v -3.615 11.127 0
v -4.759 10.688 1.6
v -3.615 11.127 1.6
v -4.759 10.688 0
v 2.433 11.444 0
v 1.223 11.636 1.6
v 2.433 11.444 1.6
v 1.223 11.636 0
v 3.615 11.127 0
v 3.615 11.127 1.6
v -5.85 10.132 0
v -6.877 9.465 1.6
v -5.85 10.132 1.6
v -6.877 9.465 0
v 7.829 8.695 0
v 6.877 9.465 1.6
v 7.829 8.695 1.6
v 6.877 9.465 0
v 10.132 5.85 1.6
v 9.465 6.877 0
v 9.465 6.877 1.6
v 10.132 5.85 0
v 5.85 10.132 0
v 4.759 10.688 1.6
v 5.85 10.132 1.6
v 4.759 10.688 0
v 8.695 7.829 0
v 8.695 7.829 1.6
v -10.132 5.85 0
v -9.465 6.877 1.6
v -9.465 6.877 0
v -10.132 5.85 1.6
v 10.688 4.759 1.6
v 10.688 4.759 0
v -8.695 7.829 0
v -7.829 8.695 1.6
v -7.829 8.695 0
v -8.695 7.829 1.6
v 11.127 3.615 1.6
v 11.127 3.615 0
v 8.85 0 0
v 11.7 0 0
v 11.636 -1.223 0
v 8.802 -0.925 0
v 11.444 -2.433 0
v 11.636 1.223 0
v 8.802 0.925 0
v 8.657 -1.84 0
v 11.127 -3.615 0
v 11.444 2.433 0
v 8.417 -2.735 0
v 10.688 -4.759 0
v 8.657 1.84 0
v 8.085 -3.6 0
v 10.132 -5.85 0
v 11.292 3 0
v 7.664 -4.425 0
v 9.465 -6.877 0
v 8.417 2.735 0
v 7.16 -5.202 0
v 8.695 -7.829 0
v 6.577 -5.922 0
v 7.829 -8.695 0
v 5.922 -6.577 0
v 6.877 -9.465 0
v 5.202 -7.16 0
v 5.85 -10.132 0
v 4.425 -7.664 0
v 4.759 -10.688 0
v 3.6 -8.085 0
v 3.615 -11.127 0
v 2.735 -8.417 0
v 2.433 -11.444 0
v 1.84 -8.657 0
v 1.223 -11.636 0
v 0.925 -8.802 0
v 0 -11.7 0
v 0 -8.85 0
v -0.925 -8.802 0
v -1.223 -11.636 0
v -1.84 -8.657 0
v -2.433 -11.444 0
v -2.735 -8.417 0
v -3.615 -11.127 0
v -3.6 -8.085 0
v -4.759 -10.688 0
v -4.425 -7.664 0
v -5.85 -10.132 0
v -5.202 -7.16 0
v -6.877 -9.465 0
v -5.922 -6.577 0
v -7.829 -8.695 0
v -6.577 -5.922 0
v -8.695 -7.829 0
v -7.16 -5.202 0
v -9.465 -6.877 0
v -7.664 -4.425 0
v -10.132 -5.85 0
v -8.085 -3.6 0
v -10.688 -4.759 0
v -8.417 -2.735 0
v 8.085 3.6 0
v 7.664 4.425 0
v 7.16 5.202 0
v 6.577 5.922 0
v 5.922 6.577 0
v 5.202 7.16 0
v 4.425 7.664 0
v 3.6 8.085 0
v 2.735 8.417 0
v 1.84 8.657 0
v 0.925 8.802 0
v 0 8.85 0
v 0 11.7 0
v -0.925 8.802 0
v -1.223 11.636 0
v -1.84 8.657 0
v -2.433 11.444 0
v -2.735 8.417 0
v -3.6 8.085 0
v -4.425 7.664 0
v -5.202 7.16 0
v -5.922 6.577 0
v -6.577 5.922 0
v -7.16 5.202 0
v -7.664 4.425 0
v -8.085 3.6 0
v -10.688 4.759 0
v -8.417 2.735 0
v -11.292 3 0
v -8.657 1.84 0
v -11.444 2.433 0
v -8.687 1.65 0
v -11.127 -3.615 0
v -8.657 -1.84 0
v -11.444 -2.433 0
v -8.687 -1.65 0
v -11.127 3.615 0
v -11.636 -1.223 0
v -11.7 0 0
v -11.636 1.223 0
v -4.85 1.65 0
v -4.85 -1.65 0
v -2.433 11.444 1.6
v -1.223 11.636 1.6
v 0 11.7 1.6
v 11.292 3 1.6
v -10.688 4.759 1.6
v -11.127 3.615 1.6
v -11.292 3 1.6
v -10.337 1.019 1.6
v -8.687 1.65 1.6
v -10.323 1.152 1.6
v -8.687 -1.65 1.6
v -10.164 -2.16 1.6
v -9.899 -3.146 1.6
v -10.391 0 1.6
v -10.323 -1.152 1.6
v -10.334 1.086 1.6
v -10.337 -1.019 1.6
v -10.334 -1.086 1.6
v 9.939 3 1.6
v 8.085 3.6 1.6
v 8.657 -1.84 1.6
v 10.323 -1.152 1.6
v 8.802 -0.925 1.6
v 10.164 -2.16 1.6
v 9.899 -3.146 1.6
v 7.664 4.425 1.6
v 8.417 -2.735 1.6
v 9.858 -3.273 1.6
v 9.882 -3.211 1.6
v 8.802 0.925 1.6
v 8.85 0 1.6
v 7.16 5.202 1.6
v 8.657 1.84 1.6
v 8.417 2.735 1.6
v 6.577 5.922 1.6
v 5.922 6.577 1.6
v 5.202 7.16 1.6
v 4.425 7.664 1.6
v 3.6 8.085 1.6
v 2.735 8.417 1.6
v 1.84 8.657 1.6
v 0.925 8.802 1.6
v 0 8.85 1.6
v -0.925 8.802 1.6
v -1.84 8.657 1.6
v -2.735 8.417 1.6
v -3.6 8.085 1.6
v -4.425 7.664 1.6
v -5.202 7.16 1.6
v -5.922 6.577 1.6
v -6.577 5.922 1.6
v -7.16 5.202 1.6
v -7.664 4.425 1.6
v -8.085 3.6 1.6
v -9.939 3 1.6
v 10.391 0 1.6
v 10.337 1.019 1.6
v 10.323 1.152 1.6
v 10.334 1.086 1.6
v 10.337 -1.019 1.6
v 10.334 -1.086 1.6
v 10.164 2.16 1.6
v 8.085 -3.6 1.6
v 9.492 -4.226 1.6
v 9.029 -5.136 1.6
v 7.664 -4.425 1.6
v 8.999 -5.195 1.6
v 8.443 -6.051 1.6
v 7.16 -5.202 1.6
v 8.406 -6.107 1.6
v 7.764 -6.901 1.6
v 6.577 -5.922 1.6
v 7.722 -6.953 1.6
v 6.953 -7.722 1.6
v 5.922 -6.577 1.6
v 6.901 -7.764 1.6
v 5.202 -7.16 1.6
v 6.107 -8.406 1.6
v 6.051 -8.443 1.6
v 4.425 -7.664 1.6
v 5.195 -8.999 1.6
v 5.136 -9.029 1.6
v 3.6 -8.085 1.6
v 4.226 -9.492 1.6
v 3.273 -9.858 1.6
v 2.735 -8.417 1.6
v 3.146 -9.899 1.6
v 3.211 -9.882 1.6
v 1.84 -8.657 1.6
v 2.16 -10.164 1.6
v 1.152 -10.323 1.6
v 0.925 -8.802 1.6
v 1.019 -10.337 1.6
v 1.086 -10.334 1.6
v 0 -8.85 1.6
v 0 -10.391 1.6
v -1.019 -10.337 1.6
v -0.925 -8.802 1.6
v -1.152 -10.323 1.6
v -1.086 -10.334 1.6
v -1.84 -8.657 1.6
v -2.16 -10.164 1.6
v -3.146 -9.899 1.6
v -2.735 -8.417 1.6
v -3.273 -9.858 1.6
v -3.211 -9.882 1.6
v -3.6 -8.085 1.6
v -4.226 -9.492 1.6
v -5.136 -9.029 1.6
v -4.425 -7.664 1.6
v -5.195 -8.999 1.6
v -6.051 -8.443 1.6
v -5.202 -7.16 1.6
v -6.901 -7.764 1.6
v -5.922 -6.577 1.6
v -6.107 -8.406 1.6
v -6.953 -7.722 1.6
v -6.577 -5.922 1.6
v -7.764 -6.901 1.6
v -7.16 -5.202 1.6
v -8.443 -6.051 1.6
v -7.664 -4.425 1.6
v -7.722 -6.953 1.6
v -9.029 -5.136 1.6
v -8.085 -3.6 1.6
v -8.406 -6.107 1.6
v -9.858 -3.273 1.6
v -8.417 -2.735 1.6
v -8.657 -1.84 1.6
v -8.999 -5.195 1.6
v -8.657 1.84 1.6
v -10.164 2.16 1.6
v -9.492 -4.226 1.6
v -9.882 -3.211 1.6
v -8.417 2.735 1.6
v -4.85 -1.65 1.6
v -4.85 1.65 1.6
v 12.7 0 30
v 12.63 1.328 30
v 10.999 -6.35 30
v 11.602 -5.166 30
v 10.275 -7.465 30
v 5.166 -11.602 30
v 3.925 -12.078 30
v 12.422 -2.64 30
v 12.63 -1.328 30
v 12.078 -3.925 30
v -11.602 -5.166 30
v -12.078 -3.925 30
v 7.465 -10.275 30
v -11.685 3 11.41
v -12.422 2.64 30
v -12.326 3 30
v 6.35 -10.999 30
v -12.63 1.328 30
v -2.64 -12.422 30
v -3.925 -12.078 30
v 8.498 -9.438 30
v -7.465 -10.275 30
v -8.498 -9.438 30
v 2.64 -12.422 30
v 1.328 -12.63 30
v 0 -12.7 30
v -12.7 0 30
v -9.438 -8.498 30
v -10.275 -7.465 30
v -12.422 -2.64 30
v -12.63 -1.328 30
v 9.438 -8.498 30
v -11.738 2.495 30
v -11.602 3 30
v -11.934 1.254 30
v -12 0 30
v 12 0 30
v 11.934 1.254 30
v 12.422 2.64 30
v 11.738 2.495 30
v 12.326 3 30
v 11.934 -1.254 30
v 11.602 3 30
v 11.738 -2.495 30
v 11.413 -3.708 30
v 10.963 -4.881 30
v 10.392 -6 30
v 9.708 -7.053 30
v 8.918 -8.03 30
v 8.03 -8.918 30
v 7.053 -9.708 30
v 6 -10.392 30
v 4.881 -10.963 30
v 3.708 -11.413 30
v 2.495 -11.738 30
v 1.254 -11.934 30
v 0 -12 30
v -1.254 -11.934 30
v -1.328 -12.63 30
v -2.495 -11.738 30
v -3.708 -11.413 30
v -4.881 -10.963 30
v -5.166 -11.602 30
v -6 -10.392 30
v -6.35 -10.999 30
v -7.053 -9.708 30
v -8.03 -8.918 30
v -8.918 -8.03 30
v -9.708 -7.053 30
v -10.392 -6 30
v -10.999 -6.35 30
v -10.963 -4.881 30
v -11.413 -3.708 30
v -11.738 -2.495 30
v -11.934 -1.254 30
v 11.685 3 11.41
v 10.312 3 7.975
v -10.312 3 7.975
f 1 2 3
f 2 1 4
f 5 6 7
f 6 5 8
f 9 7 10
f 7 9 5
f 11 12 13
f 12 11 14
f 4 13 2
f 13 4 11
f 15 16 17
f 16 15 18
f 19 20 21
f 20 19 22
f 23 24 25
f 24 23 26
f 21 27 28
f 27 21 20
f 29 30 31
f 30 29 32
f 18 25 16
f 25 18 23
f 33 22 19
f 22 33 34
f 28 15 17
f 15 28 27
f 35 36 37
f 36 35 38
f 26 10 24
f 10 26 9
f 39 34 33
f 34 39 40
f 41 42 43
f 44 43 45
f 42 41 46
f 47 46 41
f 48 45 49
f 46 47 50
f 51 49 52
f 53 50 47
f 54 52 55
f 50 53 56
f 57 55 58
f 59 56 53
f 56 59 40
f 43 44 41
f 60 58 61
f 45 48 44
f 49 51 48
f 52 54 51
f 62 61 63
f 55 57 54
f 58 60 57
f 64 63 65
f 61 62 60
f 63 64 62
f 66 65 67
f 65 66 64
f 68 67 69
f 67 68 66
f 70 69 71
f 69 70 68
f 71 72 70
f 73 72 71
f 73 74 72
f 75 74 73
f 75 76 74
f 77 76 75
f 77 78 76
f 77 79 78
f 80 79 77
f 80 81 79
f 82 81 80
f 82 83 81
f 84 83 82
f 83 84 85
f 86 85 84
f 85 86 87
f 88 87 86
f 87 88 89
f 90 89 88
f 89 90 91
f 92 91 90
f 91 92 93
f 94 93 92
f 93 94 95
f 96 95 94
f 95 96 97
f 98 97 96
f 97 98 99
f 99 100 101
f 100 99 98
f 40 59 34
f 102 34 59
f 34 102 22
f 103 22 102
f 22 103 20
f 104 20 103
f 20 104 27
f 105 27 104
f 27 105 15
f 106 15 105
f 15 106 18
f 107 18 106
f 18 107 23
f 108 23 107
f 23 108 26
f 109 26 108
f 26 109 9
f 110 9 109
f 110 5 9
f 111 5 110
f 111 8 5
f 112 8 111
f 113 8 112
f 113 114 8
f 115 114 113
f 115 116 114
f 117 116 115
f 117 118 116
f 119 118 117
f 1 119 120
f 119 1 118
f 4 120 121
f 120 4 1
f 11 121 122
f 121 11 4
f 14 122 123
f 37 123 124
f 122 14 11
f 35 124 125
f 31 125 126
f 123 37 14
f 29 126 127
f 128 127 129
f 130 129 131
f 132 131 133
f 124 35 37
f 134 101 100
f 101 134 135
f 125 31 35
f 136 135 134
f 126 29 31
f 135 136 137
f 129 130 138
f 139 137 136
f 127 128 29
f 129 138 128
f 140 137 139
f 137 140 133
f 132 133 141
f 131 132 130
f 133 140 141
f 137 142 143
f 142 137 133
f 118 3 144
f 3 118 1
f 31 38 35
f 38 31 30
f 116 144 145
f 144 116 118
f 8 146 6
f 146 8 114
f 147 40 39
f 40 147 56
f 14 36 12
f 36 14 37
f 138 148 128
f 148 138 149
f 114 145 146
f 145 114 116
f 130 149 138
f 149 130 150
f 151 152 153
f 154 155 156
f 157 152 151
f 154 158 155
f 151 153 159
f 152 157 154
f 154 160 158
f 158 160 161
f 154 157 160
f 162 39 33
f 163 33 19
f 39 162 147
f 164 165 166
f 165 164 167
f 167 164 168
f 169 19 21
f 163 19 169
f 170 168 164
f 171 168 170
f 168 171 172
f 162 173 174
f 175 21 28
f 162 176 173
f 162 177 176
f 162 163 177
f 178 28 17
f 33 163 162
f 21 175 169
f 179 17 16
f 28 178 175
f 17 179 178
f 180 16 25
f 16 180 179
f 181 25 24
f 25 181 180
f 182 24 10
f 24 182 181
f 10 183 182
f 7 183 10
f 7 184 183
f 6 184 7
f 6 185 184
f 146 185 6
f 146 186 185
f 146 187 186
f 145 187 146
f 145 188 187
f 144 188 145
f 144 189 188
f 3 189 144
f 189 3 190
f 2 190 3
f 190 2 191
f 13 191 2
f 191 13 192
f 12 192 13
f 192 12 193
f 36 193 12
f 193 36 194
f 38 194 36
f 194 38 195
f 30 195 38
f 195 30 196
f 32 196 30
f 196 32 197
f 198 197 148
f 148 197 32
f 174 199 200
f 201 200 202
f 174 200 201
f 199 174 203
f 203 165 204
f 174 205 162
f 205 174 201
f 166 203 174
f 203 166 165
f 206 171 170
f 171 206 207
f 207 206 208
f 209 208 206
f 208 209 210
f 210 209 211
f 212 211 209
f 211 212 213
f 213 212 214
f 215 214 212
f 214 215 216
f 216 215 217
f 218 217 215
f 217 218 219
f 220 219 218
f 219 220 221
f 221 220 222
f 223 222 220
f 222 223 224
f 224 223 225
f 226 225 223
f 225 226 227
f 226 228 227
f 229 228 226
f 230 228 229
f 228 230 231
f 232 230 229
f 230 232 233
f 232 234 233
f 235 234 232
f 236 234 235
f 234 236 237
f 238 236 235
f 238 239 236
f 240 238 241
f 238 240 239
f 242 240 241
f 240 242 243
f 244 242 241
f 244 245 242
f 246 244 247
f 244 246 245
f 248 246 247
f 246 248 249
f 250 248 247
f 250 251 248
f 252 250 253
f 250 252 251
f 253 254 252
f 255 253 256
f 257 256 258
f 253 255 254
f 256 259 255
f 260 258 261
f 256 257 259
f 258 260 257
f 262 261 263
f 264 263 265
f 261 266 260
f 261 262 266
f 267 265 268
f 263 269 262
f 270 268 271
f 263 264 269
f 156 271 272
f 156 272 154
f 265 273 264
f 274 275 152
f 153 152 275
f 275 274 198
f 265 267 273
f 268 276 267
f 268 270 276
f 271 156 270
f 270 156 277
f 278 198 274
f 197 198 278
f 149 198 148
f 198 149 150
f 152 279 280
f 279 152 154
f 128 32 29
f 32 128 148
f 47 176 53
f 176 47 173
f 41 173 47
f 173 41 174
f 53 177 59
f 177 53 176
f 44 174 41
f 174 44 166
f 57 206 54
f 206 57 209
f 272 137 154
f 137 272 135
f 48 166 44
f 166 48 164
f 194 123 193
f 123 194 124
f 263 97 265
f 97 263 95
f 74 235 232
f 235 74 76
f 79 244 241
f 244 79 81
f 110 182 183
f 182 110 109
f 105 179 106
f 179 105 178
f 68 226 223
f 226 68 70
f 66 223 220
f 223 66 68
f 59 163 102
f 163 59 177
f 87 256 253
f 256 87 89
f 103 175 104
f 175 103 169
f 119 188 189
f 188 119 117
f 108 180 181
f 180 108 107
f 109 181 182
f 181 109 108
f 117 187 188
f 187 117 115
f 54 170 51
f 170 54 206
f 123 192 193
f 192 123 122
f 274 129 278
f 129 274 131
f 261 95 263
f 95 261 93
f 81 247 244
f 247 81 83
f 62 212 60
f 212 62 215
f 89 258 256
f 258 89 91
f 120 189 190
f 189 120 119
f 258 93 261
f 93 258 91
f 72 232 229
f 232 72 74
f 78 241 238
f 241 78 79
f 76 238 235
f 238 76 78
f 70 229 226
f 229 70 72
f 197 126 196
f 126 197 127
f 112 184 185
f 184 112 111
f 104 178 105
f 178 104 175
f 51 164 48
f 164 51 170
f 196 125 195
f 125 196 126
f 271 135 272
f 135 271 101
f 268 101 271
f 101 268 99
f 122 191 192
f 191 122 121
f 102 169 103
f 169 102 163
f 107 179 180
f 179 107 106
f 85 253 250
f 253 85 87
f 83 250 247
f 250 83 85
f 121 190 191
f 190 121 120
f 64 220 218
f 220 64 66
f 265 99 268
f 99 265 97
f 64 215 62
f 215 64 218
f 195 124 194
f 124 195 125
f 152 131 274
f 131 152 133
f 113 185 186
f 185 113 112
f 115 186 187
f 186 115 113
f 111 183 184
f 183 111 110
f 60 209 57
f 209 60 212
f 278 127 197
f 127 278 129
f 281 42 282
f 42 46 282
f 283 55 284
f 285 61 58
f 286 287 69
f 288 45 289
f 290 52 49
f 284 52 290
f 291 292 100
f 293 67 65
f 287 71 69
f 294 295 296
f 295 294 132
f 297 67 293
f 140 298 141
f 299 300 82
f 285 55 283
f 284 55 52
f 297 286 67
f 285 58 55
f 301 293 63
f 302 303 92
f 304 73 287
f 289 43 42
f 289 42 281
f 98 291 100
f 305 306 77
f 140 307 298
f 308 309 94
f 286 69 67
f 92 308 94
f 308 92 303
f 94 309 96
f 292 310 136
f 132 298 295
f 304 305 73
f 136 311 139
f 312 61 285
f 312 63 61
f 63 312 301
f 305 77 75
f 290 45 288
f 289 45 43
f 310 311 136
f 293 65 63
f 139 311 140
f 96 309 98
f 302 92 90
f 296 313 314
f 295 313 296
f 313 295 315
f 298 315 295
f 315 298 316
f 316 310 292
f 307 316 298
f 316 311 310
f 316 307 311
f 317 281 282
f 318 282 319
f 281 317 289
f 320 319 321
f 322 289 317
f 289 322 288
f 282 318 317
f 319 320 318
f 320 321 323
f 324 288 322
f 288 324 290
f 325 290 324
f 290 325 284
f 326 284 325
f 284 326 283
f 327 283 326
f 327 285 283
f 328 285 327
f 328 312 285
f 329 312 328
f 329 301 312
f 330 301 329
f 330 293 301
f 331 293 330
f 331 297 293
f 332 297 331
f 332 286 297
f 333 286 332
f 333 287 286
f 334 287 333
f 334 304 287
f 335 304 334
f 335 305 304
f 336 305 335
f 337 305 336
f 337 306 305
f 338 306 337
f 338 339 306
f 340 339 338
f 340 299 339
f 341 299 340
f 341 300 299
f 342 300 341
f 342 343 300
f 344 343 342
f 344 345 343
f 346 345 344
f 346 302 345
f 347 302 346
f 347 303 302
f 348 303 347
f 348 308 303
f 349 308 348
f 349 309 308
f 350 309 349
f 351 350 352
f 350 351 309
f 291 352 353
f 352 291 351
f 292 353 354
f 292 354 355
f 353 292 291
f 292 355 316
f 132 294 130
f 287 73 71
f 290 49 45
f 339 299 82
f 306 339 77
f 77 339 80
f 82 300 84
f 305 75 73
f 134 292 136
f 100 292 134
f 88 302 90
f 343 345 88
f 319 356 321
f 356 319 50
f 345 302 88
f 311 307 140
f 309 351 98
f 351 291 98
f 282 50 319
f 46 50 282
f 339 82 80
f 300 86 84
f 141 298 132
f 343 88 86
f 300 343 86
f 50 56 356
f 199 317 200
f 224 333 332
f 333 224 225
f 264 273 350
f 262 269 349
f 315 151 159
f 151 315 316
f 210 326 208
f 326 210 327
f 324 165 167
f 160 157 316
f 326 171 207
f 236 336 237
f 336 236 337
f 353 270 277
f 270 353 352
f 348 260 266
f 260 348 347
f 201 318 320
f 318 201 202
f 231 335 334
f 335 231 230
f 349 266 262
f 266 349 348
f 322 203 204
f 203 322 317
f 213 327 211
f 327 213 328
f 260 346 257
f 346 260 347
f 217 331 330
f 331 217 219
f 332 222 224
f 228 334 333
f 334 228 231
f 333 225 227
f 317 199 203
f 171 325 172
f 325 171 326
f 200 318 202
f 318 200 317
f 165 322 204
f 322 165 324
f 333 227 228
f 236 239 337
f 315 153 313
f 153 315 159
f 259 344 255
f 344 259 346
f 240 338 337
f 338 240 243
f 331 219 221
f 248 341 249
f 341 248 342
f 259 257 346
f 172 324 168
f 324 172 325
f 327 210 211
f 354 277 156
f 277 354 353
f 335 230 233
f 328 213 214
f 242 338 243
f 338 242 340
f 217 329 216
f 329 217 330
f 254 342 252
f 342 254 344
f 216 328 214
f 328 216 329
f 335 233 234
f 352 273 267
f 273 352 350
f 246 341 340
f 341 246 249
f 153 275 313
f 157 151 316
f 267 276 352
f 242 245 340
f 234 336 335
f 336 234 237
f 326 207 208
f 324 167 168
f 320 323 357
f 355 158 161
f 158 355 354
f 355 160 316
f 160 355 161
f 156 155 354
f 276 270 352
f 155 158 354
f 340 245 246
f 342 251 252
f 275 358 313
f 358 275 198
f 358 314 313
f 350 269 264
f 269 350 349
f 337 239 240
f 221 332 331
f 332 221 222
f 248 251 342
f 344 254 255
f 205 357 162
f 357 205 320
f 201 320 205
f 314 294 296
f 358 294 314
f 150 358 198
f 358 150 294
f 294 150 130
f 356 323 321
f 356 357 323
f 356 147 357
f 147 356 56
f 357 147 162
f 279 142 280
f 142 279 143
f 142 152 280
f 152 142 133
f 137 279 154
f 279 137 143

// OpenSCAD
//height ring
h1=1.6;  
//height protector
h2=30;   
//inner diameter ring
d1=17.7; 
//outer diameter ring
d2=23.4;
//thickness cylinder
x=1.4;  
//gradient of conus (upper side is slightly wider)
c=1.0; 
//x-dimension of nipple
a=4.0;   
//y-dimension of nipple
b=3.3;      


// Ring
difference() {
	cylinder(h1,d2/2,d2/2, $fn=60 );
	rotate ([0,0,0]) cylinder(h1,d1/2,d1/2,$fn=60 );
}
//Nipple
translate([-d1/2,-b/2,0])  cube([a,b,h1]);   //change x-transformation  for left/right

//protector-cylinder
difference() {
	cylinder(h2,d2/2,d2/2+c, $fn=60 );
	rotate ([0,0,0]) cylinder(h2,d2/2-x,d2/2+c-x/2, $fn=60 );
    translate([-50,+3,0])  cube([100,100,100]);
}
